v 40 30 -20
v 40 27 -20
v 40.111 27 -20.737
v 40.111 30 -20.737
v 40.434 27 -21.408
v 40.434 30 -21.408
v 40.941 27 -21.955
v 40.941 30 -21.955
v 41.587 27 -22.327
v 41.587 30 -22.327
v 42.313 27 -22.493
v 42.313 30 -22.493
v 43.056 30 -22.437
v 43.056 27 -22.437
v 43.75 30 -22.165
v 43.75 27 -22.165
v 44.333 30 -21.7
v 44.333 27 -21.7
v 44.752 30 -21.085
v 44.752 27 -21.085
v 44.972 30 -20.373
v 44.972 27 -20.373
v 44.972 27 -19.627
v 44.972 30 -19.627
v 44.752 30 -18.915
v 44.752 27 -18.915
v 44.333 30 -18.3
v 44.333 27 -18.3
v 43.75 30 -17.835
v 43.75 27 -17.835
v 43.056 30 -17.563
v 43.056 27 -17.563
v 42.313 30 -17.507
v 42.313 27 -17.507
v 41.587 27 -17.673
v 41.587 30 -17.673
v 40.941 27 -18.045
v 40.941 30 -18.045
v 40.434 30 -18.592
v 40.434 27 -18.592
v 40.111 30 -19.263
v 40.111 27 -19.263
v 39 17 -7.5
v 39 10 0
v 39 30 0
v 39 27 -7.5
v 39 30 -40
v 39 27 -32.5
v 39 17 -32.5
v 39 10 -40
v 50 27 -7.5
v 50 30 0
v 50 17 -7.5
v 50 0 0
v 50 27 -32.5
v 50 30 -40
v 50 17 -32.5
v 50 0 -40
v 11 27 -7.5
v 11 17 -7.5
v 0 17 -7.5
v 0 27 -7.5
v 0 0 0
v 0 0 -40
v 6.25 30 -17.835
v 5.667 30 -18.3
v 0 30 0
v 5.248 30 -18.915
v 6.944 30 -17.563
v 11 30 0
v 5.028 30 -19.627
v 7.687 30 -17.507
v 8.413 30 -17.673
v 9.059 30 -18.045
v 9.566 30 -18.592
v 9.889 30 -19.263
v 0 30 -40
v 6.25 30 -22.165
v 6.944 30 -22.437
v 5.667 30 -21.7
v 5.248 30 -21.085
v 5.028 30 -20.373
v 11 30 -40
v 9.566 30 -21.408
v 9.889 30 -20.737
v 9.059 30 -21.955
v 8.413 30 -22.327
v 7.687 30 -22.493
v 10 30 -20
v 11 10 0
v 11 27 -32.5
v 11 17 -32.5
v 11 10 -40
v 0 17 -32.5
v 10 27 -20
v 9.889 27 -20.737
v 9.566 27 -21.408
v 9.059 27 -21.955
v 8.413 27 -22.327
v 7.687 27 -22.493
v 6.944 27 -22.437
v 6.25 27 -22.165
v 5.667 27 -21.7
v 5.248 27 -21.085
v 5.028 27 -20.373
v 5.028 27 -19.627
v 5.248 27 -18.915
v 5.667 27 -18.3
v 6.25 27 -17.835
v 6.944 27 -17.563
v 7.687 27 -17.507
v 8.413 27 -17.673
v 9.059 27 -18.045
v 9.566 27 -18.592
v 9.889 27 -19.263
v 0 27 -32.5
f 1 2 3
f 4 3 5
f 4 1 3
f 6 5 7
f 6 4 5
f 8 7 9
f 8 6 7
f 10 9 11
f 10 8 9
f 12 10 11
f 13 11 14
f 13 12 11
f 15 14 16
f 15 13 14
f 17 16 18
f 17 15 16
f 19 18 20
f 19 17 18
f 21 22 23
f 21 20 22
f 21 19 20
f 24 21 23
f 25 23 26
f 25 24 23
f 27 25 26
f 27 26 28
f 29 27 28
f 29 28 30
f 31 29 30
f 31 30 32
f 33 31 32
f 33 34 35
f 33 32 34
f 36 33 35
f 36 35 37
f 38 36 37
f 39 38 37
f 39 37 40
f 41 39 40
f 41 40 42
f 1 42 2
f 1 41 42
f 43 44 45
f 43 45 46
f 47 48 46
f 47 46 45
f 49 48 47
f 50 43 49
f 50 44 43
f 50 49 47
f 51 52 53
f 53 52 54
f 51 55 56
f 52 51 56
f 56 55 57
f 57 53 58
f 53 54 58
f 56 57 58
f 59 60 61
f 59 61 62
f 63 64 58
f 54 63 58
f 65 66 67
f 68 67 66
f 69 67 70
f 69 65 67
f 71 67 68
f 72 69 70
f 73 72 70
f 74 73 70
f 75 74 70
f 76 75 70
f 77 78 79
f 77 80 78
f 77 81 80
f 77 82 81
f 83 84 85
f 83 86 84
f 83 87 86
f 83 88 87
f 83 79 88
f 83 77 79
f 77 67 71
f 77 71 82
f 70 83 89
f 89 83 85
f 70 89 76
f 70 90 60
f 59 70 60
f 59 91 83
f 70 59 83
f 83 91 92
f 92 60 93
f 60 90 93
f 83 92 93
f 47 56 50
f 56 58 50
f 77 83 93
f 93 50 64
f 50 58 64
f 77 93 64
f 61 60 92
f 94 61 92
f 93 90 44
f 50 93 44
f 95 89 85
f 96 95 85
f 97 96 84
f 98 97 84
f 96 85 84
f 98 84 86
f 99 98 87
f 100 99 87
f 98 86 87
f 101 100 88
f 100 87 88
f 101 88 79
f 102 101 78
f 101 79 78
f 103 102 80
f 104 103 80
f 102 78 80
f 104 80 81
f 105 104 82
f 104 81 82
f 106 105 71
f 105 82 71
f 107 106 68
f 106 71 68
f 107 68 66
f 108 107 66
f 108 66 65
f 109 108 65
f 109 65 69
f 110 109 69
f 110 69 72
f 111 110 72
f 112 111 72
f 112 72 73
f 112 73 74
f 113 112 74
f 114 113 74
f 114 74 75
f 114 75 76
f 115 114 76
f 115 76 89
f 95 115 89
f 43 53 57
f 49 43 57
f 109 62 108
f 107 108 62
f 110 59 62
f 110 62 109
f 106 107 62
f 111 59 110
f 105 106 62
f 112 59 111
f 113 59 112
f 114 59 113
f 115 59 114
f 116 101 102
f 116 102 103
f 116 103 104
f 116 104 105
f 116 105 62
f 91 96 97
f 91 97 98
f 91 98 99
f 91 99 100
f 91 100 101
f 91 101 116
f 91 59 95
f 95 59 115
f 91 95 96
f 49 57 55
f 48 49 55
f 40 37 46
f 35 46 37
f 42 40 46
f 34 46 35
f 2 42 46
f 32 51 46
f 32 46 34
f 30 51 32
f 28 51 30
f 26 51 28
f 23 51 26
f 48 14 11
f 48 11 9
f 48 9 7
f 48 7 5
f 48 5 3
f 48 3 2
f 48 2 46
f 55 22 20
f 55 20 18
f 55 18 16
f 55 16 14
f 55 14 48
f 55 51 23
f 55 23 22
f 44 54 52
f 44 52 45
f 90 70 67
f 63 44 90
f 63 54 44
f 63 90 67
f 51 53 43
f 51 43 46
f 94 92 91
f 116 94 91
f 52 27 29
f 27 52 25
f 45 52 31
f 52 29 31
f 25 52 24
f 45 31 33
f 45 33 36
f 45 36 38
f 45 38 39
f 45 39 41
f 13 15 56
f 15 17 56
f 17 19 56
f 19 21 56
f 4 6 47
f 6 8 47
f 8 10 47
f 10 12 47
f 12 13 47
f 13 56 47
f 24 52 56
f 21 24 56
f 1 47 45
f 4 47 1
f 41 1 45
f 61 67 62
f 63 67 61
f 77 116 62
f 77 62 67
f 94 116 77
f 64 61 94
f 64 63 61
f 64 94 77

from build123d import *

# Parameters (mm, degrees)
SKETCH1_W           = 50
SKETCH1_H           = 40
BOSS_EXTRUDE1_DEPTH = 10
SKETCH3_W           = 11
SKETCH3_H           = 40
BOSS_EXTRUDE2_DEPTH = 20
SKETCH4_W           = 25
SKETCH4_H           = 10
CUT_EXTRUDE1_DEPTH  = 51
SKETCH5_R           = 2.5
CUT_EXTRUDE2_DEPTH  = 13


with BuildPart() as part:
    # Sketch1 → Boss-Extrude1 (new body)
    with BuildSketch(Plane(origin=(0, 0, 0), x_dir=(1, 0, 0), z_dir=(0, 1, 0))):
        with Locations((25, 20)):
            Rectangle(SKETCH1_W, SKETCH1_H)
    extrude(amount=BOSS_EXTRUDE1_DEPTH)

    # Sketch3 → Boss-Extrude2 (add)
    with BuildSketch(Plane(origin=(0, 10, 0), x_dir=(1, 0, 0), z_dir=(0, 1, 0))):
        with Locations((5.5, 20)):
            Rectangle(SKETCH3_W, SKETCH3_H)
    boss_extrude2 = extrude(amount=BOSS_EXTRUDE2_DEPTH)

    # Mirror1: Boss-Extrude2 across plane
    add(boss_extrude2.mirror(Plane.ZY.offset(-25)))

    # Sketch4 → Cut-Extrude1 (cut, through all)
    with BuildSketch(Plane(origin=(50, 0, 0), x_dir=(0, 0, -1), z_dir=(1, 0, 0))):
        with Locations((20, 22)):
            Rectangle(SKETCH4_W, SKETCH4_H)
    extrude(amount=-CUT_EXTRUDE1_DEPTH, mode=Mode.SUBTRACT)

    # Sketch5 → Cut-Extrude2 (cut)
    with BuildSketch(Plane(origin=(0, 30, 0), x_dir=(1, 0, 0), z_dir=(0, 1, 0))):
        with Locations((7.5, 20)):
            Circle(SKETCH5_R)
    cut_extrude2 = extrude(amount=-CUT_EXTRUDE2_DEPTH, mode=Mode.SUBTRACT)

    # Mirror2: Cut-Extrude2 across plane
    add(cut_extrude2.mirror(Plane.ZY.offset(-25)), mode=Mode.SUBTRACT)


solid = part.part
